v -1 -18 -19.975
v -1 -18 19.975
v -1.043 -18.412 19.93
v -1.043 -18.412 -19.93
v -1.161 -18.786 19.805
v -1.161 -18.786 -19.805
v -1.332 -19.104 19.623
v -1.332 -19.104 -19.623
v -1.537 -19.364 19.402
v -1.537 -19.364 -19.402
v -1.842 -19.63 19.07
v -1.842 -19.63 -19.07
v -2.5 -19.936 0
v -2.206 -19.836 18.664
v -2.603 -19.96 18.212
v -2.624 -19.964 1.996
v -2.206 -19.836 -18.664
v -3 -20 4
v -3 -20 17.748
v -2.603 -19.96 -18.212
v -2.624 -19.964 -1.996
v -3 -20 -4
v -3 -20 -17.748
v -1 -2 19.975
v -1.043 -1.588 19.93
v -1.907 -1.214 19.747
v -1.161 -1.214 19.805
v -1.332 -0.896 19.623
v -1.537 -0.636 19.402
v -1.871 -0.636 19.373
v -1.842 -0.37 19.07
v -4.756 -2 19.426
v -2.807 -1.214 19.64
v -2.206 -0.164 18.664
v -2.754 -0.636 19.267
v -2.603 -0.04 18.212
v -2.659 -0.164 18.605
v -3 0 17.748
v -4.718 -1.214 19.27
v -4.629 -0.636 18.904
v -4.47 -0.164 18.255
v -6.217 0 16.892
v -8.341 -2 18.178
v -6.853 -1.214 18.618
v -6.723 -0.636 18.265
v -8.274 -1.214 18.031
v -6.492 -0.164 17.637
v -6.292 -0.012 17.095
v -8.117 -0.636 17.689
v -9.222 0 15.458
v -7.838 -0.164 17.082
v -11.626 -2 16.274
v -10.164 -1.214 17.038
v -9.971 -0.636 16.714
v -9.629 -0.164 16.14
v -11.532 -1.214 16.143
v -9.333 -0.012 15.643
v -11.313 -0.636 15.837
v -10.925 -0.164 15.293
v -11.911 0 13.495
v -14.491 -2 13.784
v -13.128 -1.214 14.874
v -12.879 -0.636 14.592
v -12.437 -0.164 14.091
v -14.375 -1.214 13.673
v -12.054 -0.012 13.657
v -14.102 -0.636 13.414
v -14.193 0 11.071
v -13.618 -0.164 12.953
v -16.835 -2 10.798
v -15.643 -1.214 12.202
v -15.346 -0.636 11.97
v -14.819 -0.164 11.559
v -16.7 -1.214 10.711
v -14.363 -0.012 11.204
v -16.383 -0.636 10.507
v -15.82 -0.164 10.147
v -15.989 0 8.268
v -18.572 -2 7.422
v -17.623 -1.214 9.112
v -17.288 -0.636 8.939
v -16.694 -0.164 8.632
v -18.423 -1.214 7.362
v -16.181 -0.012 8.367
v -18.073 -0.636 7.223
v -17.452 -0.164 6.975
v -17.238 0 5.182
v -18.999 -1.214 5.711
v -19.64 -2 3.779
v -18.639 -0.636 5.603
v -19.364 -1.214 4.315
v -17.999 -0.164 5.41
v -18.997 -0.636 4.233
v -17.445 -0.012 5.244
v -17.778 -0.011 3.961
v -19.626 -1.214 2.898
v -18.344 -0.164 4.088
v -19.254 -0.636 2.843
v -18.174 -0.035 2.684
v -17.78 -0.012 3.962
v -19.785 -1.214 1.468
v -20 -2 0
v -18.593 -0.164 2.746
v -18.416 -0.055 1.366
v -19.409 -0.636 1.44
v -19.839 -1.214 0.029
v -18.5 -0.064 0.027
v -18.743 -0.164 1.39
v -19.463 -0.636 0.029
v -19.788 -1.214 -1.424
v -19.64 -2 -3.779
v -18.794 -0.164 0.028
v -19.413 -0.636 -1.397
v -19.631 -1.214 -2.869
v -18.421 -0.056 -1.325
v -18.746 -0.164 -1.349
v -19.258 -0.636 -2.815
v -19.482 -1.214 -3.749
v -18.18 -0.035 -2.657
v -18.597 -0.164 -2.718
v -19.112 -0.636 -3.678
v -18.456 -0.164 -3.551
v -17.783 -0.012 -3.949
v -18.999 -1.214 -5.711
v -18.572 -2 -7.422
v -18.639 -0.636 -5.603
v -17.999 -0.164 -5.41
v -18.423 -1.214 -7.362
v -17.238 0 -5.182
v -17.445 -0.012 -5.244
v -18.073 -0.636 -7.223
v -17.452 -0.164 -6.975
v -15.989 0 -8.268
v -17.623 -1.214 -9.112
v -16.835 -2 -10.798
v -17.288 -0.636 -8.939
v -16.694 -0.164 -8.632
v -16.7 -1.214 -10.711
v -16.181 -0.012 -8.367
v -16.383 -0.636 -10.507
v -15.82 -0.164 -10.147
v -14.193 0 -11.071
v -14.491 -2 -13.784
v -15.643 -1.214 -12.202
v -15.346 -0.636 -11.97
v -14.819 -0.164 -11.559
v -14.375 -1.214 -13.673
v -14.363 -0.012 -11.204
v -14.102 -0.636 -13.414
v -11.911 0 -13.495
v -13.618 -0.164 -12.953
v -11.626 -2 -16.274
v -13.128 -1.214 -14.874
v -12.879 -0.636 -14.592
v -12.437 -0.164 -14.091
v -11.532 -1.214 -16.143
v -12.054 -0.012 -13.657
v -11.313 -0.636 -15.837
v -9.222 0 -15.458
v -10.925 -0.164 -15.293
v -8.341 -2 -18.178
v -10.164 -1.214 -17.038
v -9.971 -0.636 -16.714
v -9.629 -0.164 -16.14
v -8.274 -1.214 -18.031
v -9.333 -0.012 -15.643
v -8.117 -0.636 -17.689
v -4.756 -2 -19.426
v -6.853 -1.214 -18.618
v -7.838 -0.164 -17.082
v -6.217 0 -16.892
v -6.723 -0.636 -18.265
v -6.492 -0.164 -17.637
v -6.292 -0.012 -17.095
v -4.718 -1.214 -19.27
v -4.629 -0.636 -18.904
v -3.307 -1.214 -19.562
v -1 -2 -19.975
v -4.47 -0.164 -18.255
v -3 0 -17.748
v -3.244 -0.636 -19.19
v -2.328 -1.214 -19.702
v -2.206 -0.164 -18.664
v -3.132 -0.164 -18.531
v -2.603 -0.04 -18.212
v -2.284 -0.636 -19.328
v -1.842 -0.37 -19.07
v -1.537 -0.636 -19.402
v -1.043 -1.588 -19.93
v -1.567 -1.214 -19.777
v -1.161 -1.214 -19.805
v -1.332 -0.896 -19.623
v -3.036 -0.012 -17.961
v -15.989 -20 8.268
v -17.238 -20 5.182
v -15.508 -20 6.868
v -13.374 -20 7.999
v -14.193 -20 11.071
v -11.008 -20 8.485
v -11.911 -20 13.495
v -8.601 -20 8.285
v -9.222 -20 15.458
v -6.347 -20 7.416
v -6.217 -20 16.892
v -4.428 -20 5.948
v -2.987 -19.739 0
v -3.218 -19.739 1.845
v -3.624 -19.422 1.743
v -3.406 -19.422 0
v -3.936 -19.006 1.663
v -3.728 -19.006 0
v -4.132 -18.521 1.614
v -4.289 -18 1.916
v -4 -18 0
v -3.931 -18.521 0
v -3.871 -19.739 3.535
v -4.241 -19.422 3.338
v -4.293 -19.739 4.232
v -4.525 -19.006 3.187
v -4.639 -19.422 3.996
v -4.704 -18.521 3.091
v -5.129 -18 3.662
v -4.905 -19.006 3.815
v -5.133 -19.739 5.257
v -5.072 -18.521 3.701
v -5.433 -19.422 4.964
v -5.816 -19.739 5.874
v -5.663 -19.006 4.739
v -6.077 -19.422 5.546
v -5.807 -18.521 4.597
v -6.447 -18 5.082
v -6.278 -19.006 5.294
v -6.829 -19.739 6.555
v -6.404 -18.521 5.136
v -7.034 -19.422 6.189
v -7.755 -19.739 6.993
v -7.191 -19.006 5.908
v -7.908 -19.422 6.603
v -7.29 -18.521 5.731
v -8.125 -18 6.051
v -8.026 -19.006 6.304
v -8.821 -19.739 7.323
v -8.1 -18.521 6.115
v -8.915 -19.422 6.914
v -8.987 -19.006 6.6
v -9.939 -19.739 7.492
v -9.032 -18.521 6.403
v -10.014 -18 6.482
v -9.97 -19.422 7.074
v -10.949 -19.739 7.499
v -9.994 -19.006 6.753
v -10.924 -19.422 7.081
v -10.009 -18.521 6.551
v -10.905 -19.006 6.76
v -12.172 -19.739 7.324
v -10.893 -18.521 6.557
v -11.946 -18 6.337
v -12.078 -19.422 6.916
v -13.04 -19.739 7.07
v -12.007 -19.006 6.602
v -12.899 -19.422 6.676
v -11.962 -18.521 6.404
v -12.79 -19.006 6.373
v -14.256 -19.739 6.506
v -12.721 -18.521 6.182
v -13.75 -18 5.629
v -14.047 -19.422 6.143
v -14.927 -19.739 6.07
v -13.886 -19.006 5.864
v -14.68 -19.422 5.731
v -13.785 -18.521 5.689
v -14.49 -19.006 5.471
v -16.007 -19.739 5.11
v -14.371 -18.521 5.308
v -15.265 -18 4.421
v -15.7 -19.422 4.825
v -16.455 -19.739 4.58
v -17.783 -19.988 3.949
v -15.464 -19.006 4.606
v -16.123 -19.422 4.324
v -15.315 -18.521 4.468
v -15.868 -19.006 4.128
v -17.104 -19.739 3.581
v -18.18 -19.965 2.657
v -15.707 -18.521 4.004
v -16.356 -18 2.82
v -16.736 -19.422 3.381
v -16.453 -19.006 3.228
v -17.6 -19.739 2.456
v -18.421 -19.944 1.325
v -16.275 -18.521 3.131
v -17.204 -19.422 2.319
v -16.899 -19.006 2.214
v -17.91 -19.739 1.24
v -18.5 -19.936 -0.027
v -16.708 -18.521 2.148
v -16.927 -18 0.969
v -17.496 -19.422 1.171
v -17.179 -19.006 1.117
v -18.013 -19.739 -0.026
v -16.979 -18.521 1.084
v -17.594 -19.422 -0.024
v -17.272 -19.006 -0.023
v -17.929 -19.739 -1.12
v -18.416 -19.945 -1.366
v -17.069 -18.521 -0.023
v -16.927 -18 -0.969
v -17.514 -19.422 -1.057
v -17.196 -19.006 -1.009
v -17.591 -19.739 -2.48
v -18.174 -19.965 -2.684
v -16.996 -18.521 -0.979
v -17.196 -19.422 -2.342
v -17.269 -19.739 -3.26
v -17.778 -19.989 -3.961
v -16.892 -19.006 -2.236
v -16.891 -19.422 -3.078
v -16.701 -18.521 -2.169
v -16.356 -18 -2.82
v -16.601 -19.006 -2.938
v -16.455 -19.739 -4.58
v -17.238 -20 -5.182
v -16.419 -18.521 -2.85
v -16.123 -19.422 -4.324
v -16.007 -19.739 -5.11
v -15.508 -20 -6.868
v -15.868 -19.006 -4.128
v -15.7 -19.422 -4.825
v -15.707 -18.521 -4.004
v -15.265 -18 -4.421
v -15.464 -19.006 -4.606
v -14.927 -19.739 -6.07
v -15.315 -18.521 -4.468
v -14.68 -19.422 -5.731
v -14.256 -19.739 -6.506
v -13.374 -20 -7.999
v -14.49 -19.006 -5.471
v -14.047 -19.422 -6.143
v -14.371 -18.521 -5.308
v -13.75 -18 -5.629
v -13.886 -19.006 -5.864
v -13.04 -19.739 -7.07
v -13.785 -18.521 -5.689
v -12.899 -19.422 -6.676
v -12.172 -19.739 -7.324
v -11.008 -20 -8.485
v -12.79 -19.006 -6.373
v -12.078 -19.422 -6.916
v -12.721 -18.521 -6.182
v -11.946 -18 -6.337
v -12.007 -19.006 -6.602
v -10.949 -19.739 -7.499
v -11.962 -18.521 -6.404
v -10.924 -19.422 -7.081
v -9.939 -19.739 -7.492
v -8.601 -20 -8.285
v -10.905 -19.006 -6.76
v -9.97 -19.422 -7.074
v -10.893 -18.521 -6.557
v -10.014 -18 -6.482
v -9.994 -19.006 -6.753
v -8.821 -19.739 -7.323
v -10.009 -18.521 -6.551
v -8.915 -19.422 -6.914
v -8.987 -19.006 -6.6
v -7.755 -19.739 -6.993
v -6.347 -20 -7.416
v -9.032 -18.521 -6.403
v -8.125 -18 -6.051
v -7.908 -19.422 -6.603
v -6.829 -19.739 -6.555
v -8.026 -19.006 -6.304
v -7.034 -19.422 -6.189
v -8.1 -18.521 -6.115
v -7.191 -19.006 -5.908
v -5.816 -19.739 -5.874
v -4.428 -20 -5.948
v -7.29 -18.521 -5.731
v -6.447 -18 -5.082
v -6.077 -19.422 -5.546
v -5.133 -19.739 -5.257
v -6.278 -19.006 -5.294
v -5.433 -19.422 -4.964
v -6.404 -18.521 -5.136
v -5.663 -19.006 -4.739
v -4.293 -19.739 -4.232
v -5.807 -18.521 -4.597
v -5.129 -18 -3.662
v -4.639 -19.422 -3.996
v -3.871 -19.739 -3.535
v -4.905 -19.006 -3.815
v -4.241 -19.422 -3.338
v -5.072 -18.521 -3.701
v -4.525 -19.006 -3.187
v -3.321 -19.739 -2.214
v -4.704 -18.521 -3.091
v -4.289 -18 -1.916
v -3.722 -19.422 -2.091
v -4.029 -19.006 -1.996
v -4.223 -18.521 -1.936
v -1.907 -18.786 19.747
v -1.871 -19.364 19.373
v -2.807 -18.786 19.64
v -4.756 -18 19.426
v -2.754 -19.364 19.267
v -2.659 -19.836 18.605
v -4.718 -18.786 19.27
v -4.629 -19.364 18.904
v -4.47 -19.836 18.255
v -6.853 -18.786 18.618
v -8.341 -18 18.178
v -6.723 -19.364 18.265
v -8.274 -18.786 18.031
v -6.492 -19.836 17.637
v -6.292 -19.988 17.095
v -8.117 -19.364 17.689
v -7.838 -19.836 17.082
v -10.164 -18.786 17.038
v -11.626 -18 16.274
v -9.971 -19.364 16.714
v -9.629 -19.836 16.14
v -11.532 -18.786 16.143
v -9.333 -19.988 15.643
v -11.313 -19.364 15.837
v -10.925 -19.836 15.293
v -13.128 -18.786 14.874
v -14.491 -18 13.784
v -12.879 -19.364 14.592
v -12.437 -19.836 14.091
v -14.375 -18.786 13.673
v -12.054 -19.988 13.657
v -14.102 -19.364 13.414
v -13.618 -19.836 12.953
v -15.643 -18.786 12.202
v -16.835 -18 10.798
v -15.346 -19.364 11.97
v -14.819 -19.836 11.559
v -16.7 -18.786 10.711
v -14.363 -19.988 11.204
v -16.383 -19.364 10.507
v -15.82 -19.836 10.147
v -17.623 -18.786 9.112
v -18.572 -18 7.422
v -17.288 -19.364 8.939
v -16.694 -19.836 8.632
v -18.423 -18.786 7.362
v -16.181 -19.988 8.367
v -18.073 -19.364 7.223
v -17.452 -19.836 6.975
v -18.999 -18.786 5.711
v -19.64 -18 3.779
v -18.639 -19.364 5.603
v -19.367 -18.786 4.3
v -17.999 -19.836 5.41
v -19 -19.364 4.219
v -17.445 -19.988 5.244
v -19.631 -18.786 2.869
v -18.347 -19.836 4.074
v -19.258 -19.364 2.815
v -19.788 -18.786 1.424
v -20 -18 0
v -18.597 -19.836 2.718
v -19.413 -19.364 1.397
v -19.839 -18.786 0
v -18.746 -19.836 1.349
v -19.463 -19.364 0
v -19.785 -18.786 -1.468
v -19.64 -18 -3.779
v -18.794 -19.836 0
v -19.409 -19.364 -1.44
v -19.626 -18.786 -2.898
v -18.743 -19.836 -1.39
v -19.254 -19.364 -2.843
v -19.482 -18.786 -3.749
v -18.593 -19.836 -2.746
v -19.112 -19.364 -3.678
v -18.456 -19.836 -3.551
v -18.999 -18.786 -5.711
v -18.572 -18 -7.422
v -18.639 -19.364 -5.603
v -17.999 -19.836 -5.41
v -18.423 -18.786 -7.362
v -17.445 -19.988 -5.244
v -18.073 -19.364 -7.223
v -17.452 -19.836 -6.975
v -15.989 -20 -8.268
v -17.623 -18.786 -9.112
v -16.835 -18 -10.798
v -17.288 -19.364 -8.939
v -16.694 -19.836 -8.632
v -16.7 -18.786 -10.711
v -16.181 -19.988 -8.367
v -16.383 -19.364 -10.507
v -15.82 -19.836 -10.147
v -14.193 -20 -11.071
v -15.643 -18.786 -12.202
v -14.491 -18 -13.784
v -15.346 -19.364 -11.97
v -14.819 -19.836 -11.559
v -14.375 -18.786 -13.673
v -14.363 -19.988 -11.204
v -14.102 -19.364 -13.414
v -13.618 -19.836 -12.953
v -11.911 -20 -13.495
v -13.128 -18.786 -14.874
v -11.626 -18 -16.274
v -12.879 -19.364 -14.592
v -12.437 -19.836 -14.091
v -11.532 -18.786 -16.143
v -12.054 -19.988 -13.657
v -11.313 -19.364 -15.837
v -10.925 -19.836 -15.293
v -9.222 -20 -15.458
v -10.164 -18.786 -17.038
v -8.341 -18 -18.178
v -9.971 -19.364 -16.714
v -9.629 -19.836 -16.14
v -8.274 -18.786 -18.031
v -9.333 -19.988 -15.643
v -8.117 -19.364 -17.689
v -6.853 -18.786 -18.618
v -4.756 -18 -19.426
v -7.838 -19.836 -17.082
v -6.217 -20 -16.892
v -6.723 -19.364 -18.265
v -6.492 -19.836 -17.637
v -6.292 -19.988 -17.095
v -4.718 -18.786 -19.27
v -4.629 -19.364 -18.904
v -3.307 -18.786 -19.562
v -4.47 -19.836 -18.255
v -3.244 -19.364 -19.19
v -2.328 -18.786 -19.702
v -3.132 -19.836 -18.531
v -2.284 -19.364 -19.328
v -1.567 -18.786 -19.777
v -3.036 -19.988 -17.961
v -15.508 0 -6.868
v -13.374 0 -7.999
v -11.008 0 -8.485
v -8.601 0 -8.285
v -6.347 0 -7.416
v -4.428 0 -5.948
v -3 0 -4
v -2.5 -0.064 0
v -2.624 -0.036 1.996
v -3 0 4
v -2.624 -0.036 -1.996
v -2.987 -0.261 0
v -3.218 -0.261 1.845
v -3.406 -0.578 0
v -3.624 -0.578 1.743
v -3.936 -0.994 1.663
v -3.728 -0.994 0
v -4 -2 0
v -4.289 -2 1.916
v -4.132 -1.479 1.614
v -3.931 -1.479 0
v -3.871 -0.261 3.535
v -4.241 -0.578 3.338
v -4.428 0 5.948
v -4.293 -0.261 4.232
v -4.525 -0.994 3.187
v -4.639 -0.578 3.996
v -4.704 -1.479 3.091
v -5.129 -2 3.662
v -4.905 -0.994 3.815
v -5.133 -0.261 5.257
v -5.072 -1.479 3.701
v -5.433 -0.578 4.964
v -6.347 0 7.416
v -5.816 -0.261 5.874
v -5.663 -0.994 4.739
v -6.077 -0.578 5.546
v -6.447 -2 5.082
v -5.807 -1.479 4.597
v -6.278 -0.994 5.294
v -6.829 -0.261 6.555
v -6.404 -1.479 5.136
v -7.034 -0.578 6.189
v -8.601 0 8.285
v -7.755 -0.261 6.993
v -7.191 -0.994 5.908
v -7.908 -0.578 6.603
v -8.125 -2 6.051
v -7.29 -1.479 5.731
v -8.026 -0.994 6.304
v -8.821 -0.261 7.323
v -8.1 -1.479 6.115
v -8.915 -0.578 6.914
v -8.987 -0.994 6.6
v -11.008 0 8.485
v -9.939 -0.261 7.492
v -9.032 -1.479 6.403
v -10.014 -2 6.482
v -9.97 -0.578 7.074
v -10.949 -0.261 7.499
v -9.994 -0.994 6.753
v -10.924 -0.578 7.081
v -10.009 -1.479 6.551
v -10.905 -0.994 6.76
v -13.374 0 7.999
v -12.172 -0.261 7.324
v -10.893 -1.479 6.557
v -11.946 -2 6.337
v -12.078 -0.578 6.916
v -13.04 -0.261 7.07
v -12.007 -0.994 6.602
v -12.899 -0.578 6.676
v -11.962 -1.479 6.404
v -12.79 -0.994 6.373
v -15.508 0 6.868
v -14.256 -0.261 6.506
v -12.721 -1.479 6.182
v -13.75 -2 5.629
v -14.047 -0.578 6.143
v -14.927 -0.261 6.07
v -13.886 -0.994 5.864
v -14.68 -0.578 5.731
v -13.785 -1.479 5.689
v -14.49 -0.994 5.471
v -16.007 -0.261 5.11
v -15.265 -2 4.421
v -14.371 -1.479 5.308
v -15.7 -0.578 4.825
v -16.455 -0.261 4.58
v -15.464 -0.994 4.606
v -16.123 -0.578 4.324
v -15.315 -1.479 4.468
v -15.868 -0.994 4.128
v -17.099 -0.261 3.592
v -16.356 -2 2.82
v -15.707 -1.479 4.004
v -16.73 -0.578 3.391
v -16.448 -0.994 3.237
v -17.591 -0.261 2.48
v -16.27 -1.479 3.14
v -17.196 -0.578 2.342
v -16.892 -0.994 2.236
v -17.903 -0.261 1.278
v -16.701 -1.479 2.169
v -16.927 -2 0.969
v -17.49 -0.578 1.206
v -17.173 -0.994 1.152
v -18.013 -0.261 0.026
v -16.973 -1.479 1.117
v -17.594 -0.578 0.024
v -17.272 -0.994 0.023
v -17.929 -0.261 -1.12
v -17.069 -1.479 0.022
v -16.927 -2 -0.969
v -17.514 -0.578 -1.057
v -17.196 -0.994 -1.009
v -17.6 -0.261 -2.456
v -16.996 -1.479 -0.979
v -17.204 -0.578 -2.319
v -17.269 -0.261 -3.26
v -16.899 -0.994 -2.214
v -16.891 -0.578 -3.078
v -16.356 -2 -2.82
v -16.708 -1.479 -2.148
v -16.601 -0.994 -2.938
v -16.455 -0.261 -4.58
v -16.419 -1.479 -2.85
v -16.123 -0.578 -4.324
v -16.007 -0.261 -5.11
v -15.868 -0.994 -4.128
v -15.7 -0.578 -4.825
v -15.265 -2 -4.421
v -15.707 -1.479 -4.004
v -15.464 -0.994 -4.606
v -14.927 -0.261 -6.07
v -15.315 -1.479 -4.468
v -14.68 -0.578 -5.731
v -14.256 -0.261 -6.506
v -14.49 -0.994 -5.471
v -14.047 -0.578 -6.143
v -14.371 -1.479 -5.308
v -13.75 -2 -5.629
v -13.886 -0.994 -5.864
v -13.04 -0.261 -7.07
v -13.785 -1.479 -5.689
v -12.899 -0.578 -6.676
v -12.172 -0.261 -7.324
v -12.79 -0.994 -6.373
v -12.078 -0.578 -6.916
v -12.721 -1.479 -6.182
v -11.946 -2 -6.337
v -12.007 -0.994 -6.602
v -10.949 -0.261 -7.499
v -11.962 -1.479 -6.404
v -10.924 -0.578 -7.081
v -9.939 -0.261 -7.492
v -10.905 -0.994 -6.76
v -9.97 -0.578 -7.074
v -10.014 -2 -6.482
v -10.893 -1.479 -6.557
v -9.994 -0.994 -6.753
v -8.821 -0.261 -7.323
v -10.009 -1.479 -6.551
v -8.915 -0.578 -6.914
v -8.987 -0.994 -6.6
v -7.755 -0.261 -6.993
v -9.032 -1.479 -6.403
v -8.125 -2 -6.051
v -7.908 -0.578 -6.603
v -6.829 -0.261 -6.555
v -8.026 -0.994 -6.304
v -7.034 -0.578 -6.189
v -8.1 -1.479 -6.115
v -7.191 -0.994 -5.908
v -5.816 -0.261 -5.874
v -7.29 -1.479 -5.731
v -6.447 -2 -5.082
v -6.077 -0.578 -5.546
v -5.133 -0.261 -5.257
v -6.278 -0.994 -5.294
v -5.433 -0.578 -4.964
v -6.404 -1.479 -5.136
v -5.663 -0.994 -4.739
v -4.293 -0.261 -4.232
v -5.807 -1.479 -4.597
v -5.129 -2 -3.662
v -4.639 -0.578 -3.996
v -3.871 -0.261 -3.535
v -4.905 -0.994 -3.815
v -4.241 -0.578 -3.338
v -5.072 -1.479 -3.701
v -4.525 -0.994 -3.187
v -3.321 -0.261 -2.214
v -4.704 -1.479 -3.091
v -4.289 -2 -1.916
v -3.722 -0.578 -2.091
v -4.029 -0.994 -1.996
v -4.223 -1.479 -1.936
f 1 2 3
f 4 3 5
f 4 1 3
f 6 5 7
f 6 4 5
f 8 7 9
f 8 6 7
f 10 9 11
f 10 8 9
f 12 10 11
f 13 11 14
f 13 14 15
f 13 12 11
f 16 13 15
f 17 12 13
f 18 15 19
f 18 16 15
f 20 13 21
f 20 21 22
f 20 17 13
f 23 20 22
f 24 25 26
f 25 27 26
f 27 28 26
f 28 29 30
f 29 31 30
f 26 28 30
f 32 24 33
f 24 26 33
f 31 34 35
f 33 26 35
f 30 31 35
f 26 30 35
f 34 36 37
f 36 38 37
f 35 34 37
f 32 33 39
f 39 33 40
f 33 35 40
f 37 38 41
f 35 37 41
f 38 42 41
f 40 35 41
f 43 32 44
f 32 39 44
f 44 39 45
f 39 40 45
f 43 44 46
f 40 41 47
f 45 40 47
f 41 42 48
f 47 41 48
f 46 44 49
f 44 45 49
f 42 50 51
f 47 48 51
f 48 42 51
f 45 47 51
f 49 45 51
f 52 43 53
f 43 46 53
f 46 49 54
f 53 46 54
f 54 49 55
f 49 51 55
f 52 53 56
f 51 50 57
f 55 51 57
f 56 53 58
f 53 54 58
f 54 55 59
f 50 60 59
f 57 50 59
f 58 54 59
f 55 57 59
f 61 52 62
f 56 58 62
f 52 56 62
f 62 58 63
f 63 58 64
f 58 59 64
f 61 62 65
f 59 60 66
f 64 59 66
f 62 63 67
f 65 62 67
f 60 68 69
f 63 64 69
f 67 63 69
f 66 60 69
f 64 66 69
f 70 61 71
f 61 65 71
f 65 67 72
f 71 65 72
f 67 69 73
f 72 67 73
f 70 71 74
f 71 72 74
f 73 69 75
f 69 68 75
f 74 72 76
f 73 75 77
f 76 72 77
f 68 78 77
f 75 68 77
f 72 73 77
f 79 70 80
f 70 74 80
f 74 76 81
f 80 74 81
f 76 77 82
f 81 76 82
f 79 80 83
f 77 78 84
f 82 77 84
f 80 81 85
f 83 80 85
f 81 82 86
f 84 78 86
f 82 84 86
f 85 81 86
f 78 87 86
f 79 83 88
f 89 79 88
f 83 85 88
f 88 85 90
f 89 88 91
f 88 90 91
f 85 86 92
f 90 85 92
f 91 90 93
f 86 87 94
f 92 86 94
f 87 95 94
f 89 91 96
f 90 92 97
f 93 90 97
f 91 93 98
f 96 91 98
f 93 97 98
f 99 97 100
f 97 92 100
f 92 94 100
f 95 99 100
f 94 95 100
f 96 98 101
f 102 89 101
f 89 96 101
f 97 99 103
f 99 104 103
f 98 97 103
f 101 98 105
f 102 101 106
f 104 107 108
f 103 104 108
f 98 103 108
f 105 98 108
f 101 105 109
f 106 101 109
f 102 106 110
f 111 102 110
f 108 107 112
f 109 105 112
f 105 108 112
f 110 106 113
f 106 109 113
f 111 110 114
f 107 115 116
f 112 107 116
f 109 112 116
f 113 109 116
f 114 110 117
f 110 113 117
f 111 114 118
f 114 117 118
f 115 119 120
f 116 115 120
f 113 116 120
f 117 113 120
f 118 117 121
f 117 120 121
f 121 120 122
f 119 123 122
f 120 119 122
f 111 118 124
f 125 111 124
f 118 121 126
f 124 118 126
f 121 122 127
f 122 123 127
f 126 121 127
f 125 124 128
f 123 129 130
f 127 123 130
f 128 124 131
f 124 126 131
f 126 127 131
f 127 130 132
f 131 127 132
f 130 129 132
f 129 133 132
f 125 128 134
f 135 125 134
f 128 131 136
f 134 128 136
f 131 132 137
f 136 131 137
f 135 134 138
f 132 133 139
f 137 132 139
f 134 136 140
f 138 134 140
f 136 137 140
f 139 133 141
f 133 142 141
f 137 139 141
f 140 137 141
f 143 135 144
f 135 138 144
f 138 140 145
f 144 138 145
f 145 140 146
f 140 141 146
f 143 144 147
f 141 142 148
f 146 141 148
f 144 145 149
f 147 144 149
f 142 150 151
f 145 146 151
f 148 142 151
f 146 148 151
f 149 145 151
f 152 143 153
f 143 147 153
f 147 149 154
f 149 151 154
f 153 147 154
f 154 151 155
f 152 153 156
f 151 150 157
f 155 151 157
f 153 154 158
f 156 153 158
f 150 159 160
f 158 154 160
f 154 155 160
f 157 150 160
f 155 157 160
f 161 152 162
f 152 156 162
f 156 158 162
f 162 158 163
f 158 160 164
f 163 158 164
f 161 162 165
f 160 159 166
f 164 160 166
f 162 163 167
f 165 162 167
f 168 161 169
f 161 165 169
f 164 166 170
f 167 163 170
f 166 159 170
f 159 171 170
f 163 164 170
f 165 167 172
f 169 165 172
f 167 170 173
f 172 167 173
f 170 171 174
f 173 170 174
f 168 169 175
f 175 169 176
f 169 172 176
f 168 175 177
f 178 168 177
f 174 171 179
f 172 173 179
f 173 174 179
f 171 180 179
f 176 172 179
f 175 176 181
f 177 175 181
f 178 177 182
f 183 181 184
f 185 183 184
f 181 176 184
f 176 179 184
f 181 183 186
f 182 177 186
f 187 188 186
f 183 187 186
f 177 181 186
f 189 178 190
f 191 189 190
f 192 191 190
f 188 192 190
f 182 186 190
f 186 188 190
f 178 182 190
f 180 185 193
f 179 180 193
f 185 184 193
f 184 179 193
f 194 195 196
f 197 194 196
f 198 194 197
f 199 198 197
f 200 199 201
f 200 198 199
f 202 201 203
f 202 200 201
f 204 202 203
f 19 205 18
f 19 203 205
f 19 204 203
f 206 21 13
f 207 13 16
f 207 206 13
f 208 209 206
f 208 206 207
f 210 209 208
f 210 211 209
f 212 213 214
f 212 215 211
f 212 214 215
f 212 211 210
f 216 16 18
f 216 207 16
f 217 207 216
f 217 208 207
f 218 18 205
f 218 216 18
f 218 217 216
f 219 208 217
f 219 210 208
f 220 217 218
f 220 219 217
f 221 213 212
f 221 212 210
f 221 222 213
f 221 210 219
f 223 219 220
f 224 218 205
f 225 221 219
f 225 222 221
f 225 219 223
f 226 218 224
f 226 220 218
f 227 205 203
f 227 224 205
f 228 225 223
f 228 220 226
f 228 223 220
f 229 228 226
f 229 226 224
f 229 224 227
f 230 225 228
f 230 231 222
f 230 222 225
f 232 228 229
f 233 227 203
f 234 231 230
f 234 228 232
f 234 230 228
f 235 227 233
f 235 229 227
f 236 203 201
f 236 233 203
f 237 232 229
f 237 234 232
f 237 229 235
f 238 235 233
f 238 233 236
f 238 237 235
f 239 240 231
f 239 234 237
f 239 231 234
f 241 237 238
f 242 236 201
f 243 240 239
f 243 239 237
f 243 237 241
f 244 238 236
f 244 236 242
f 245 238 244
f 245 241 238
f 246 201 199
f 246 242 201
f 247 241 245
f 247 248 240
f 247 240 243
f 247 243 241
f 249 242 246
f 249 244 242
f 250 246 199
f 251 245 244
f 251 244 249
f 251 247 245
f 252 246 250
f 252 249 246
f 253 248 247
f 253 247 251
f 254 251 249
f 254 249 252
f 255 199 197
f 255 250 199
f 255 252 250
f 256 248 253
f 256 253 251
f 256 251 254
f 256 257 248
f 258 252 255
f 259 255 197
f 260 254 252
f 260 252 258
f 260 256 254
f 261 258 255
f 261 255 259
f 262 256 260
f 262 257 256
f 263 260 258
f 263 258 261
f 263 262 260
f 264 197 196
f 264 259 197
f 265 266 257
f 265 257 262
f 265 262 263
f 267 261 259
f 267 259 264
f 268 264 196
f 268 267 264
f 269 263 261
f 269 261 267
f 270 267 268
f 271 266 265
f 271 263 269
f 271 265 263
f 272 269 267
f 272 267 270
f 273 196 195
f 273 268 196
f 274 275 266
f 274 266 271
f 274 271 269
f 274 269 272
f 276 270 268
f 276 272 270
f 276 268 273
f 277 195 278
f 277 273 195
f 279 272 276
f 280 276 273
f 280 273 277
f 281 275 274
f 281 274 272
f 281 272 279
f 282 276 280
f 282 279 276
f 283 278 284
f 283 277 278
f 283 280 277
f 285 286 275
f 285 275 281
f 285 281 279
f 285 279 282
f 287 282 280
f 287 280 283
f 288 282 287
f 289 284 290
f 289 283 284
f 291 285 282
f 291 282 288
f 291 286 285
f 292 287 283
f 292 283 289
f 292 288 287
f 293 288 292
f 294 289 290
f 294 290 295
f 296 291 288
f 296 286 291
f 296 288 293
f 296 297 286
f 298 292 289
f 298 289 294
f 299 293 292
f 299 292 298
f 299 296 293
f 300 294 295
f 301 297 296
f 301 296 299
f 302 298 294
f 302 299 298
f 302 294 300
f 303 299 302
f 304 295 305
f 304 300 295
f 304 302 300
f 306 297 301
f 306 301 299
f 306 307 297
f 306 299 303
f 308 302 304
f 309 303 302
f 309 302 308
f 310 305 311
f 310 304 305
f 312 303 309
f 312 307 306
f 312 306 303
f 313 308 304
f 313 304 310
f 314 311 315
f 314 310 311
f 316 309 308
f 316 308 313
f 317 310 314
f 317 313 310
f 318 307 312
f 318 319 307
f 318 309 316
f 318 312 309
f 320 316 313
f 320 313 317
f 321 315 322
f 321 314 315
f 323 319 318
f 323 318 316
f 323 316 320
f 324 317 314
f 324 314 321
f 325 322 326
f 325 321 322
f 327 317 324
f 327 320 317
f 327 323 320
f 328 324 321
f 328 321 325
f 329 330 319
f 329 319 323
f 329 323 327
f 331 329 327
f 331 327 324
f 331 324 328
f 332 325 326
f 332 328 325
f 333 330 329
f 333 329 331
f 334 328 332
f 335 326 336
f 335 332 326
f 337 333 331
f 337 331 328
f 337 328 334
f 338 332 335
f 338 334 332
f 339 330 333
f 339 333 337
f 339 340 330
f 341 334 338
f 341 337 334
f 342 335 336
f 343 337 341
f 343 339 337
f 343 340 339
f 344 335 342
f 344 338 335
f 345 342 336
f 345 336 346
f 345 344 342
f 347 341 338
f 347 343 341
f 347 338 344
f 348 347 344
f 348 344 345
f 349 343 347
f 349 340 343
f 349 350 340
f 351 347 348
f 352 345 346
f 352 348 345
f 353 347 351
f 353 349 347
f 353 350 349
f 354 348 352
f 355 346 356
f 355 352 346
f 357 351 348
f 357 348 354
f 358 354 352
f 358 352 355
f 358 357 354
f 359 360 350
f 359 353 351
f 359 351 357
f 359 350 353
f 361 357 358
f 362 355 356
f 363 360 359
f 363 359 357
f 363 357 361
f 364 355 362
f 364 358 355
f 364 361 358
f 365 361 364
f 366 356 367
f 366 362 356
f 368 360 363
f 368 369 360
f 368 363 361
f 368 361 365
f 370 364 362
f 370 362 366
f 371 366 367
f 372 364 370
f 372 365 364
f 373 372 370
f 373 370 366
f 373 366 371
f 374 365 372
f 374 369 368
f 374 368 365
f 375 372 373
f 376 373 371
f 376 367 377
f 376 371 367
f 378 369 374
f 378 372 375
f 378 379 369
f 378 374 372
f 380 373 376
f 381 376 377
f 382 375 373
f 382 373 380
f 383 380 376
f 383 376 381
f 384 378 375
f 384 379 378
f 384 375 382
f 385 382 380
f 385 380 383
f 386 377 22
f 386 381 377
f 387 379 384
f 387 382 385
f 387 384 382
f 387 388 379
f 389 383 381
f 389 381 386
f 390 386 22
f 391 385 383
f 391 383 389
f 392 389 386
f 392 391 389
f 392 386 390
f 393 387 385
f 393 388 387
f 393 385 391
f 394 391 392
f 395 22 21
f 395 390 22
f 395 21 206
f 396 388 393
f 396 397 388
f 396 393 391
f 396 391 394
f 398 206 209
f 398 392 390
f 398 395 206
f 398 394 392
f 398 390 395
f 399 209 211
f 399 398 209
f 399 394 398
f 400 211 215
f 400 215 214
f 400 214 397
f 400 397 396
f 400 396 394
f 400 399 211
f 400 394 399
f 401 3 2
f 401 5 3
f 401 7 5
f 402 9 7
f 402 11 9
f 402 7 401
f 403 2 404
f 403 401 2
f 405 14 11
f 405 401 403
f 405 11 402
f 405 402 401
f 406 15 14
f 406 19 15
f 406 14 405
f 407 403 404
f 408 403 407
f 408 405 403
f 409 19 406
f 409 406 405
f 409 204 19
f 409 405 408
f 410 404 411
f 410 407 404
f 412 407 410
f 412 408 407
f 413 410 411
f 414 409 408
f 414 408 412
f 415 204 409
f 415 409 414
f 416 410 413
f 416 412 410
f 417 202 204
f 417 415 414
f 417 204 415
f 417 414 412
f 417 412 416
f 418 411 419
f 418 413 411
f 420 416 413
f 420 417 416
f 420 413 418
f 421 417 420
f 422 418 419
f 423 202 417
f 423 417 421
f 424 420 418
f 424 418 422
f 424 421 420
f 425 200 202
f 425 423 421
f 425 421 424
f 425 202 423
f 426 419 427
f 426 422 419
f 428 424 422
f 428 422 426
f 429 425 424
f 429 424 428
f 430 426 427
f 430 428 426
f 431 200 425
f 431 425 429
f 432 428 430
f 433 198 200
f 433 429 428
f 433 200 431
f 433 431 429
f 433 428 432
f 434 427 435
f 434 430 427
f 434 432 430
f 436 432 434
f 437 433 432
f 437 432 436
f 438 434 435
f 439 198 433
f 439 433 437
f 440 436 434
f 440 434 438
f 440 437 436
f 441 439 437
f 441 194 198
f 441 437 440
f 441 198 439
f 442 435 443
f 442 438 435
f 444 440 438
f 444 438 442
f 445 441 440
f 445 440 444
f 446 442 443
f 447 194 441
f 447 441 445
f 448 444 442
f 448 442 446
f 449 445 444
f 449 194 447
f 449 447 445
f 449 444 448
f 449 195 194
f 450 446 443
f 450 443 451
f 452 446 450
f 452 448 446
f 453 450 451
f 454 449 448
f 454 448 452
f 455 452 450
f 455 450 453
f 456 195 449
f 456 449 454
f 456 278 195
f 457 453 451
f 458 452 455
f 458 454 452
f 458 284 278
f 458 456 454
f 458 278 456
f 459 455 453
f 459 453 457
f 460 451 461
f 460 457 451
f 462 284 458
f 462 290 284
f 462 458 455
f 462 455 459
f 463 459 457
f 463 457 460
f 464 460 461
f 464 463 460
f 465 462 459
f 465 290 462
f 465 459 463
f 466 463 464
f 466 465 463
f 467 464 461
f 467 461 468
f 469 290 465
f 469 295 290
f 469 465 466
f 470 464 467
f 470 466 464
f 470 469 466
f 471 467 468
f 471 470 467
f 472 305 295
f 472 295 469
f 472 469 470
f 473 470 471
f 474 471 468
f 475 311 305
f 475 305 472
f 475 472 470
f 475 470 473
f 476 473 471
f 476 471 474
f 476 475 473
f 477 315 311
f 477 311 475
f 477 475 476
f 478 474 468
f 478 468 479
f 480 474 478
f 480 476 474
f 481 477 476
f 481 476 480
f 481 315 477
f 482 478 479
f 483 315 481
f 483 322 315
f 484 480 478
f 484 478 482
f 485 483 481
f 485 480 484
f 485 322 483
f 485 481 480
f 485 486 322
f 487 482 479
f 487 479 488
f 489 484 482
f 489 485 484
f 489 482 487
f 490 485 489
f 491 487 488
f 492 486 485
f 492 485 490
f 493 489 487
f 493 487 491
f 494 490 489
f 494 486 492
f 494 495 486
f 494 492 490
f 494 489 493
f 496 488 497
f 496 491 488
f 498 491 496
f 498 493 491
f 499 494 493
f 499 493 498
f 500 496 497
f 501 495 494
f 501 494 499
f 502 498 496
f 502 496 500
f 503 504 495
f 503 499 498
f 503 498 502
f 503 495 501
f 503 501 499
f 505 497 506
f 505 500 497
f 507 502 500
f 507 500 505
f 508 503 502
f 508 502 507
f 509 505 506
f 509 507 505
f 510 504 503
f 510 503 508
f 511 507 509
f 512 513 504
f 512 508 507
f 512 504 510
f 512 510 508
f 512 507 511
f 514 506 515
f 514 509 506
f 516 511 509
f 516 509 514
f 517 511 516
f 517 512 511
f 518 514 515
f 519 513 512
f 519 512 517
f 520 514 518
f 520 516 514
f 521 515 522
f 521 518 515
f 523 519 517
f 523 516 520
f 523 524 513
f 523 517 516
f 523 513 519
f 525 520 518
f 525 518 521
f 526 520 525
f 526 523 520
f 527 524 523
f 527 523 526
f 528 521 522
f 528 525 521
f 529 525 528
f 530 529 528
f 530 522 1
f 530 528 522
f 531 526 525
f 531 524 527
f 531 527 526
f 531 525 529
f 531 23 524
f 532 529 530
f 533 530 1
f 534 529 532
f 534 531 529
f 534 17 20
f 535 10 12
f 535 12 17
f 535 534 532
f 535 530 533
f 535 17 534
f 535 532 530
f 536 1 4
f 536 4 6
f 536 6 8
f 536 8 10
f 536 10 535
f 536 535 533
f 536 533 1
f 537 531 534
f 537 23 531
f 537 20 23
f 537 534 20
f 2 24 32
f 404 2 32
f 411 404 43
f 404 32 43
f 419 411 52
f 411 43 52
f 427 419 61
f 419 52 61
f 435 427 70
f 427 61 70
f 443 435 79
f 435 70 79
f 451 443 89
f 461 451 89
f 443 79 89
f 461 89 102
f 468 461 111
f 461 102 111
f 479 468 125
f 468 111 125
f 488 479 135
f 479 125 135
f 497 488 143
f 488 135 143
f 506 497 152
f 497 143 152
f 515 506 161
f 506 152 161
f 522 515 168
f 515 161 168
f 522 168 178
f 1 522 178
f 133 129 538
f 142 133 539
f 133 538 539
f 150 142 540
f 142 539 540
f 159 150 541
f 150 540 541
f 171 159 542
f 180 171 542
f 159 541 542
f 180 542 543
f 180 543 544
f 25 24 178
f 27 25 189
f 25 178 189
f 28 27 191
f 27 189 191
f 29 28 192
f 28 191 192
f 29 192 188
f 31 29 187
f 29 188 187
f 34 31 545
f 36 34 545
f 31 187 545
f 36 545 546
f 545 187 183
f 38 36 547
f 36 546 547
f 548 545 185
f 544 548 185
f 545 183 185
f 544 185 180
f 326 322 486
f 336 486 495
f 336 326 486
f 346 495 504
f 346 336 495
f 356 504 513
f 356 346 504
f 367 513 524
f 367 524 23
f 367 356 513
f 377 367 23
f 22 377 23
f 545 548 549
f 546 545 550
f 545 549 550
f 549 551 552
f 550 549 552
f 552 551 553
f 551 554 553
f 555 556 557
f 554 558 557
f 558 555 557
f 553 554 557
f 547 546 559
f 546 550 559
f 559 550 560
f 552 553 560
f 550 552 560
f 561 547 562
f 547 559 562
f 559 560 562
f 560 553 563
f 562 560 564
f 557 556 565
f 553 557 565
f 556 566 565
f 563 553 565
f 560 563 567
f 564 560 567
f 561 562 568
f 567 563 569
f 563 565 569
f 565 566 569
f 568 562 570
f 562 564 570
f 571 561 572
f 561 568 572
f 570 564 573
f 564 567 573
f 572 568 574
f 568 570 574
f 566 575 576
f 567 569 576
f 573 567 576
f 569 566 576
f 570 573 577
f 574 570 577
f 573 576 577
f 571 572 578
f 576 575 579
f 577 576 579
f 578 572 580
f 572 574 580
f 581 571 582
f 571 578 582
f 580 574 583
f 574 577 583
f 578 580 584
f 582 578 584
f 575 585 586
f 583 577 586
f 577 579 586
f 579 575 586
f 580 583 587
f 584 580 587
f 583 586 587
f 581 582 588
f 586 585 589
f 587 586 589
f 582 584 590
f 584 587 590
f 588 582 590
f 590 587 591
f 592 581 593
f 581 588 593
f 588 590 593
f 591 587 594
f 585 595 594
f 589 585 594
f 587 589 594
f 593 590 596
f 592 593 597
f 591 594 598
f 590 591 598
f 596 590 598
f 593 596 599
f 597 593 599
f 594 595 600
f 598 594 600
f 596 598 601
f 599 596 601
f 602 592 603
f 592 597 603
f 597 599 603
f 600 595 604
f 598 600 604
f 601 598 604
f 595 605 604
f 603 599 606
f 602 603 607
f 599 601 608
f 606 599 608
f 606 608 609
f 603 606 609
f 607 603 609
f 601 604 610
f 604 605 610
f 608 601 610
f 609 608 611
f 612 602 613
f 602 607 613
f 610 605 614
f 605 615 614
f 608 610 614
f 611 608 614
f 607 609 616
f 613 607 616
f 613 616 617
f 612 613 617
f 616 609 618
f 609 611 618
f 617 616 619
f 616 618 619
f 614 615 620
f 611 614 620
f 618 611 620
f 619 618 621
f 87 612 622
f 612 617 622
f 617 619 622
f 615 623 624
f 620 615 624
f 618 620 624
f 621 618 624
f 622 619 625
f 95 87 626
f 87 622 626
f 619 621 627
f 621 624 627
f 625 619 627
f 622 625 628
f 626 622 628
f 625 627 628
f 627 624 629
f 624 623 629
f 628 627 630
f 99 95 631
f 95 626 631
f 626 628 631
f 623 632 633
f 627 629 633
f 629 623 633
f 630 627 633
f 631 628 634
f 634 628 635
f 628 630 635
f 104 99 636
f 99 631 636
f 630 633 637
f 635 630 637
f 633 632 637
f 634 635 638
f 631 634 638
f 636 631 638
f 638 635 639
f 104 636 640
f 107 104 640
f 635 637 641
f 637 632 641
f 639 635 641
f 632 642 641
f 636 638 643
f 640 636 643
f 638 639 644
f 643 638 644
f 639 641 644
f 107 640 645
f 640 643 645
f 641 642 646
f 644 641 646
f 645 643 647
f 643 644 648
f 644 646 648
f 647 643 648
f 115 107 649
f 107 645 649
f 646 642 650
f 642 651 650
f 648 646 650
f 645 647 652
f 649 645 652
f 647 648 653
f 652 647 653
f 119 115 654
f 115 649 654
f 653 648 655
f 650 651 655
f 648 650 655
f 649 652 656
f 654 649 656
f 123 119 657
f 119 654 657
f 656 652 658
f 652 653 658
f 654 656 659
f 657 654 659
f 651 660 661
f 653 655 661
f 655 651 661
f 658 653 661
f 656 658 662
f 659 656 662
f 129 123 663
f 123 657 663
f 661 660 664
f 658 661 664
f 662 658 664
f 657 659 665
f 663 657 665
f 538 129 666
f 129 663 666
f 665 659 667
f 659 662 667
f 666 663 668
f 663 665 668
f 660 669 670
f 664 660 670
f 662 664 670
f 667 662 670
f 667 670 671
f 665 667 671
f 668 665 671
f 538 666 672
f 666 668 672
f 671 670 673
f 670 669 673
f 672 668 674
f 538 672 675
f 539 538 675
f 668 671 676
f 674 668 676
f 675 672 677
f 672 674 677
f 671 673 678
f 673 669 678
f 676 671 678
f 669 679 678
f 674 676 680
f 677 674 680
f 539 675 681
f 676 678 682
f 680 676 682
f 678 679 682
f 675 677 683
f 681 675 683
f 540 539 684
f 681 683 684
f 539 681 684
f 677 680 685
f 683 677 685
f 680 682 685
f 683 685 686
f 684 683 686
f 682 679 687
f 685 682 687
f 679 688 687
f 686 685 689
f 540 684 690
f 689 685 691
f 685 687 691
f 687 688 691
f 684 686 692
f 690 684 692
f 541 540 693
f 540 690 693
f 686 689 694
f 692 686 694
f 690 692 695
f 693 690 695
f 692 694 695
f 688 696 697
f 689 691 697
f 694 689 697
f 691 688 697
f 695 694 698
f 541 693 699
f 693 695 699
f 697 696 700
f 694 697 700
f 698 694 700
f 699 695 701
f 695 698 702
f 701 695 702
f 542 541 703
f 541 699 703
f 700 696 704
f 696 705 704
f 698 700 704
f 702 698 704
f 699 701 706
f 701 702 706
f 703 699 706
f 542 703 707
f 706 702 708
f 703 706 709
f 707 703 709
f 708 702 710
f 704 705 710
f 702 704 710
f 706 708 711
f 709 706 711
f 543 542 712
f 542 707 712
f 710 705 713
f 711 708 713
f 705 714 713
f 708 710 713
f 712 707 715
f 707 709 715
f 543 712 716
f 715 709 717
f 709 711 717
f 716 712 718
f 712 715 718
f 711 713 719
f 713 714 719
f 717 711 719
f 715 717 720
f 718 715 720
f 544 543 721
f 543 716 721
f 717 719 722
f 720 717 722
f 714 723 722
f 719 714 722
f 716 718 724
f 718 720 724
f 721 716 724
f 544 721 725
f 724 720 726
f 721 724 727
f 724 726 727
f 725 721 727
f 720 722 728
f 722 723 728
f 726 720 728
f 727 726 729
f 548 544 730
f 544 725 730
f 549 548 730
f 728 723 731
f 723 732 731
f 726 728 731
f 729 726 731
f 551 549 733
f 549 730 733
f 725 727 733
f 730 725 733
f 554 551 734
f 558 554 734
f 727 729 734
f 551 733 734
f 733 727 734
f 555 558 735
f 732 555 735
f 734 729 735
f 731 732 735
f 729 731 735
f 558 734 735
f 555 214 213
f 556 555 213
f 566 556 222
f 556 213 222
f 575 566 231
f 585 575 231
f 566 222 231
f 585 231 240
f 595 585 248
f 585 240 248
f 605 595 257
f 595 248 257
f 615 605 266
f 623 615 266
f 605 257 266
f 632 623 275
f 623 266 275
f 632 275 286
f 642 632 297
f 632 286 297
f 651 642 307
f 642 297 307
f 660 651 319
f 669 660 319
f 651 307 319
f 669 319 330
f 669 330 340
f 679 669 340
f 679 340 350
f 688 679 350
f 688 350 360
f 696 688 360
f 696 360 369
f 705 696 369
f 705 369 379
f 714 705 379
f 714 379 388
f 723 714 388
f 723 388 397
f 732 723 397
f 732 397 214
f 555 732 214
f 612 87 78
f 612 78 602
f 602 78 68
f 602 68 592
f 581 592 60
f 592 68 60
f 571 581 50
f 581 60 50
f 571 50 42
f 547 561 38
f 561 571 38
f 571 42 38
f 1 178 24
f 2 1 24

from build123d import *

# Parameters (mm, degrees)
F1_DEPTH    = 20
F2_R        = 6.5
F3_DEPTH    = 20
F4_T1_DEPTH = 49.9499687109
F4_T4_ANGLE = 202.9591024792
F4_T6_ANGLE = 202.9591024792


# Not quite as in the source:
# - a fillet or chamfer that OpenCascade refuses, or shapes differently, is made with other operations: its cross-section is extruded or revolved along the edge and cut away or added


with BuildPart() as f1:
    # F0 (on Front) → F1 (new body)
    with BuildSketch(Plane.XZ):
        with BuildLine():
            Line((-1, 0), (-1, 19.9749843554))
            ThreePointArc((-1, 19.9749843554), (-20, 0), (-1, -19.9749843554))
            Line((-1, -19.9749843554), (-1, 0))
        make_face()
    extrude(amount=F1_DEPTH)

    # F2 (on face) → F3 (cut)
    with BuildSketch(Plane.XZ.offset(20)):
        with Locations((-10.5, 0)):
            Circle(F2_R)
    extrude(amount=-F3_DEPTH, mode=Mode.SUBTRACT)

    # F4: fillet of radius 2 on 6 edges, made by hand

    # F4_s2 → F4_t1 (cut)
    with BuildSketch(Plane.XY.offset(-24.9749843554)):
        with BuildLine():
            ThreePointArc((-1, -18), (-1.5857864376, -19.4142135624), (-3, -20))
            Line((-3, -20), (-1, -20))
            Line((-1, -20), (-1, -18))
        make_face()
        with BuildLine():
            ThreePointArc((-1, -2), (-1.5857864376, -0.5857864376), (-3, 0))
            Line((-3, 0), (-1, 0))
            Line((-1, 0), (-1, -2))
        make_face()
    extrude(amount=F4_T1_DEPTH, mode=Mode.SUBTRACT)

    # F4_s3 → F4_t4 (revolve, cut)
    with BuildSketch(Plane(origin=(0, 0, 0), x_dir=(0, 1, 0), z_dir=(0.9799957963, 0, -0.1990181884))):
        with BuildLine():
            ThreePointArc((-18, 20), (-19.4142135624, 19.4142135624), (-20, 18))
            Line((-20, 18), (-20, 20))
            Line((-20, 20), (-18, 20))
        make_face()
    revolve(axis=Axis((0, -20, 0), (0, -1, 0)), revolution_arc=F4_T4_ANGLE, mode=Mode.SUBTRACT)

    # F4_s5 → F4_t6 (revolve, cut)
    with BuildSketch(Plane(origin=(0, 0, 0), x_dir=(0, 1, 0), z_dir=(0.9799957963, 0, -0.1990181884))):
        with BuildLine():
            ThreePointArc((-2, 20), (-0.5857864376, 19.4142135624), (0, 18))
            Line((0, 18), (0, 20))
            Line((0, 20), (-2, 20))
        make_face()
    revolve(axis=Axis((0, 0, 0), (0, -1, 0)), revolution_arc=F4_T6_ANGLE, mode=Mode.SUBTRACT)

    # F4_s7 → F4_t8 (revolve, cut)
    with BuildSketch(Plane.XY):
        with BuildLine():
            ThreePointArc((-2, 0), (-3.4142135624, -0.5857864376), (-4, -2))
            Line((-4, -2), (-4, 0))
            Line((-4, 0), (-2, 0))
        make_face()
    revolve(axis=Axis((-10.5, 0, 0), (0, -1, 0)), mode=Mode.SUBTRACT)

    # F4_s9 → F4_t10 (revolve, cut)
    with BuildSketch(Plane.XY):
        with BuildLine():
            ThreePointArc((-2, -20), (-3.4142135624, -19.4142135624), (-4, -18))
            Line((-4, -18), (-4, -20))
            Line((-4, -20), (-2, -20))
        make_face()
    revolve(axis=Axis((-10.5, -20, 0), (0, -1, 0)), mode=Mode.SUBTRACT)


solid = f1.part
